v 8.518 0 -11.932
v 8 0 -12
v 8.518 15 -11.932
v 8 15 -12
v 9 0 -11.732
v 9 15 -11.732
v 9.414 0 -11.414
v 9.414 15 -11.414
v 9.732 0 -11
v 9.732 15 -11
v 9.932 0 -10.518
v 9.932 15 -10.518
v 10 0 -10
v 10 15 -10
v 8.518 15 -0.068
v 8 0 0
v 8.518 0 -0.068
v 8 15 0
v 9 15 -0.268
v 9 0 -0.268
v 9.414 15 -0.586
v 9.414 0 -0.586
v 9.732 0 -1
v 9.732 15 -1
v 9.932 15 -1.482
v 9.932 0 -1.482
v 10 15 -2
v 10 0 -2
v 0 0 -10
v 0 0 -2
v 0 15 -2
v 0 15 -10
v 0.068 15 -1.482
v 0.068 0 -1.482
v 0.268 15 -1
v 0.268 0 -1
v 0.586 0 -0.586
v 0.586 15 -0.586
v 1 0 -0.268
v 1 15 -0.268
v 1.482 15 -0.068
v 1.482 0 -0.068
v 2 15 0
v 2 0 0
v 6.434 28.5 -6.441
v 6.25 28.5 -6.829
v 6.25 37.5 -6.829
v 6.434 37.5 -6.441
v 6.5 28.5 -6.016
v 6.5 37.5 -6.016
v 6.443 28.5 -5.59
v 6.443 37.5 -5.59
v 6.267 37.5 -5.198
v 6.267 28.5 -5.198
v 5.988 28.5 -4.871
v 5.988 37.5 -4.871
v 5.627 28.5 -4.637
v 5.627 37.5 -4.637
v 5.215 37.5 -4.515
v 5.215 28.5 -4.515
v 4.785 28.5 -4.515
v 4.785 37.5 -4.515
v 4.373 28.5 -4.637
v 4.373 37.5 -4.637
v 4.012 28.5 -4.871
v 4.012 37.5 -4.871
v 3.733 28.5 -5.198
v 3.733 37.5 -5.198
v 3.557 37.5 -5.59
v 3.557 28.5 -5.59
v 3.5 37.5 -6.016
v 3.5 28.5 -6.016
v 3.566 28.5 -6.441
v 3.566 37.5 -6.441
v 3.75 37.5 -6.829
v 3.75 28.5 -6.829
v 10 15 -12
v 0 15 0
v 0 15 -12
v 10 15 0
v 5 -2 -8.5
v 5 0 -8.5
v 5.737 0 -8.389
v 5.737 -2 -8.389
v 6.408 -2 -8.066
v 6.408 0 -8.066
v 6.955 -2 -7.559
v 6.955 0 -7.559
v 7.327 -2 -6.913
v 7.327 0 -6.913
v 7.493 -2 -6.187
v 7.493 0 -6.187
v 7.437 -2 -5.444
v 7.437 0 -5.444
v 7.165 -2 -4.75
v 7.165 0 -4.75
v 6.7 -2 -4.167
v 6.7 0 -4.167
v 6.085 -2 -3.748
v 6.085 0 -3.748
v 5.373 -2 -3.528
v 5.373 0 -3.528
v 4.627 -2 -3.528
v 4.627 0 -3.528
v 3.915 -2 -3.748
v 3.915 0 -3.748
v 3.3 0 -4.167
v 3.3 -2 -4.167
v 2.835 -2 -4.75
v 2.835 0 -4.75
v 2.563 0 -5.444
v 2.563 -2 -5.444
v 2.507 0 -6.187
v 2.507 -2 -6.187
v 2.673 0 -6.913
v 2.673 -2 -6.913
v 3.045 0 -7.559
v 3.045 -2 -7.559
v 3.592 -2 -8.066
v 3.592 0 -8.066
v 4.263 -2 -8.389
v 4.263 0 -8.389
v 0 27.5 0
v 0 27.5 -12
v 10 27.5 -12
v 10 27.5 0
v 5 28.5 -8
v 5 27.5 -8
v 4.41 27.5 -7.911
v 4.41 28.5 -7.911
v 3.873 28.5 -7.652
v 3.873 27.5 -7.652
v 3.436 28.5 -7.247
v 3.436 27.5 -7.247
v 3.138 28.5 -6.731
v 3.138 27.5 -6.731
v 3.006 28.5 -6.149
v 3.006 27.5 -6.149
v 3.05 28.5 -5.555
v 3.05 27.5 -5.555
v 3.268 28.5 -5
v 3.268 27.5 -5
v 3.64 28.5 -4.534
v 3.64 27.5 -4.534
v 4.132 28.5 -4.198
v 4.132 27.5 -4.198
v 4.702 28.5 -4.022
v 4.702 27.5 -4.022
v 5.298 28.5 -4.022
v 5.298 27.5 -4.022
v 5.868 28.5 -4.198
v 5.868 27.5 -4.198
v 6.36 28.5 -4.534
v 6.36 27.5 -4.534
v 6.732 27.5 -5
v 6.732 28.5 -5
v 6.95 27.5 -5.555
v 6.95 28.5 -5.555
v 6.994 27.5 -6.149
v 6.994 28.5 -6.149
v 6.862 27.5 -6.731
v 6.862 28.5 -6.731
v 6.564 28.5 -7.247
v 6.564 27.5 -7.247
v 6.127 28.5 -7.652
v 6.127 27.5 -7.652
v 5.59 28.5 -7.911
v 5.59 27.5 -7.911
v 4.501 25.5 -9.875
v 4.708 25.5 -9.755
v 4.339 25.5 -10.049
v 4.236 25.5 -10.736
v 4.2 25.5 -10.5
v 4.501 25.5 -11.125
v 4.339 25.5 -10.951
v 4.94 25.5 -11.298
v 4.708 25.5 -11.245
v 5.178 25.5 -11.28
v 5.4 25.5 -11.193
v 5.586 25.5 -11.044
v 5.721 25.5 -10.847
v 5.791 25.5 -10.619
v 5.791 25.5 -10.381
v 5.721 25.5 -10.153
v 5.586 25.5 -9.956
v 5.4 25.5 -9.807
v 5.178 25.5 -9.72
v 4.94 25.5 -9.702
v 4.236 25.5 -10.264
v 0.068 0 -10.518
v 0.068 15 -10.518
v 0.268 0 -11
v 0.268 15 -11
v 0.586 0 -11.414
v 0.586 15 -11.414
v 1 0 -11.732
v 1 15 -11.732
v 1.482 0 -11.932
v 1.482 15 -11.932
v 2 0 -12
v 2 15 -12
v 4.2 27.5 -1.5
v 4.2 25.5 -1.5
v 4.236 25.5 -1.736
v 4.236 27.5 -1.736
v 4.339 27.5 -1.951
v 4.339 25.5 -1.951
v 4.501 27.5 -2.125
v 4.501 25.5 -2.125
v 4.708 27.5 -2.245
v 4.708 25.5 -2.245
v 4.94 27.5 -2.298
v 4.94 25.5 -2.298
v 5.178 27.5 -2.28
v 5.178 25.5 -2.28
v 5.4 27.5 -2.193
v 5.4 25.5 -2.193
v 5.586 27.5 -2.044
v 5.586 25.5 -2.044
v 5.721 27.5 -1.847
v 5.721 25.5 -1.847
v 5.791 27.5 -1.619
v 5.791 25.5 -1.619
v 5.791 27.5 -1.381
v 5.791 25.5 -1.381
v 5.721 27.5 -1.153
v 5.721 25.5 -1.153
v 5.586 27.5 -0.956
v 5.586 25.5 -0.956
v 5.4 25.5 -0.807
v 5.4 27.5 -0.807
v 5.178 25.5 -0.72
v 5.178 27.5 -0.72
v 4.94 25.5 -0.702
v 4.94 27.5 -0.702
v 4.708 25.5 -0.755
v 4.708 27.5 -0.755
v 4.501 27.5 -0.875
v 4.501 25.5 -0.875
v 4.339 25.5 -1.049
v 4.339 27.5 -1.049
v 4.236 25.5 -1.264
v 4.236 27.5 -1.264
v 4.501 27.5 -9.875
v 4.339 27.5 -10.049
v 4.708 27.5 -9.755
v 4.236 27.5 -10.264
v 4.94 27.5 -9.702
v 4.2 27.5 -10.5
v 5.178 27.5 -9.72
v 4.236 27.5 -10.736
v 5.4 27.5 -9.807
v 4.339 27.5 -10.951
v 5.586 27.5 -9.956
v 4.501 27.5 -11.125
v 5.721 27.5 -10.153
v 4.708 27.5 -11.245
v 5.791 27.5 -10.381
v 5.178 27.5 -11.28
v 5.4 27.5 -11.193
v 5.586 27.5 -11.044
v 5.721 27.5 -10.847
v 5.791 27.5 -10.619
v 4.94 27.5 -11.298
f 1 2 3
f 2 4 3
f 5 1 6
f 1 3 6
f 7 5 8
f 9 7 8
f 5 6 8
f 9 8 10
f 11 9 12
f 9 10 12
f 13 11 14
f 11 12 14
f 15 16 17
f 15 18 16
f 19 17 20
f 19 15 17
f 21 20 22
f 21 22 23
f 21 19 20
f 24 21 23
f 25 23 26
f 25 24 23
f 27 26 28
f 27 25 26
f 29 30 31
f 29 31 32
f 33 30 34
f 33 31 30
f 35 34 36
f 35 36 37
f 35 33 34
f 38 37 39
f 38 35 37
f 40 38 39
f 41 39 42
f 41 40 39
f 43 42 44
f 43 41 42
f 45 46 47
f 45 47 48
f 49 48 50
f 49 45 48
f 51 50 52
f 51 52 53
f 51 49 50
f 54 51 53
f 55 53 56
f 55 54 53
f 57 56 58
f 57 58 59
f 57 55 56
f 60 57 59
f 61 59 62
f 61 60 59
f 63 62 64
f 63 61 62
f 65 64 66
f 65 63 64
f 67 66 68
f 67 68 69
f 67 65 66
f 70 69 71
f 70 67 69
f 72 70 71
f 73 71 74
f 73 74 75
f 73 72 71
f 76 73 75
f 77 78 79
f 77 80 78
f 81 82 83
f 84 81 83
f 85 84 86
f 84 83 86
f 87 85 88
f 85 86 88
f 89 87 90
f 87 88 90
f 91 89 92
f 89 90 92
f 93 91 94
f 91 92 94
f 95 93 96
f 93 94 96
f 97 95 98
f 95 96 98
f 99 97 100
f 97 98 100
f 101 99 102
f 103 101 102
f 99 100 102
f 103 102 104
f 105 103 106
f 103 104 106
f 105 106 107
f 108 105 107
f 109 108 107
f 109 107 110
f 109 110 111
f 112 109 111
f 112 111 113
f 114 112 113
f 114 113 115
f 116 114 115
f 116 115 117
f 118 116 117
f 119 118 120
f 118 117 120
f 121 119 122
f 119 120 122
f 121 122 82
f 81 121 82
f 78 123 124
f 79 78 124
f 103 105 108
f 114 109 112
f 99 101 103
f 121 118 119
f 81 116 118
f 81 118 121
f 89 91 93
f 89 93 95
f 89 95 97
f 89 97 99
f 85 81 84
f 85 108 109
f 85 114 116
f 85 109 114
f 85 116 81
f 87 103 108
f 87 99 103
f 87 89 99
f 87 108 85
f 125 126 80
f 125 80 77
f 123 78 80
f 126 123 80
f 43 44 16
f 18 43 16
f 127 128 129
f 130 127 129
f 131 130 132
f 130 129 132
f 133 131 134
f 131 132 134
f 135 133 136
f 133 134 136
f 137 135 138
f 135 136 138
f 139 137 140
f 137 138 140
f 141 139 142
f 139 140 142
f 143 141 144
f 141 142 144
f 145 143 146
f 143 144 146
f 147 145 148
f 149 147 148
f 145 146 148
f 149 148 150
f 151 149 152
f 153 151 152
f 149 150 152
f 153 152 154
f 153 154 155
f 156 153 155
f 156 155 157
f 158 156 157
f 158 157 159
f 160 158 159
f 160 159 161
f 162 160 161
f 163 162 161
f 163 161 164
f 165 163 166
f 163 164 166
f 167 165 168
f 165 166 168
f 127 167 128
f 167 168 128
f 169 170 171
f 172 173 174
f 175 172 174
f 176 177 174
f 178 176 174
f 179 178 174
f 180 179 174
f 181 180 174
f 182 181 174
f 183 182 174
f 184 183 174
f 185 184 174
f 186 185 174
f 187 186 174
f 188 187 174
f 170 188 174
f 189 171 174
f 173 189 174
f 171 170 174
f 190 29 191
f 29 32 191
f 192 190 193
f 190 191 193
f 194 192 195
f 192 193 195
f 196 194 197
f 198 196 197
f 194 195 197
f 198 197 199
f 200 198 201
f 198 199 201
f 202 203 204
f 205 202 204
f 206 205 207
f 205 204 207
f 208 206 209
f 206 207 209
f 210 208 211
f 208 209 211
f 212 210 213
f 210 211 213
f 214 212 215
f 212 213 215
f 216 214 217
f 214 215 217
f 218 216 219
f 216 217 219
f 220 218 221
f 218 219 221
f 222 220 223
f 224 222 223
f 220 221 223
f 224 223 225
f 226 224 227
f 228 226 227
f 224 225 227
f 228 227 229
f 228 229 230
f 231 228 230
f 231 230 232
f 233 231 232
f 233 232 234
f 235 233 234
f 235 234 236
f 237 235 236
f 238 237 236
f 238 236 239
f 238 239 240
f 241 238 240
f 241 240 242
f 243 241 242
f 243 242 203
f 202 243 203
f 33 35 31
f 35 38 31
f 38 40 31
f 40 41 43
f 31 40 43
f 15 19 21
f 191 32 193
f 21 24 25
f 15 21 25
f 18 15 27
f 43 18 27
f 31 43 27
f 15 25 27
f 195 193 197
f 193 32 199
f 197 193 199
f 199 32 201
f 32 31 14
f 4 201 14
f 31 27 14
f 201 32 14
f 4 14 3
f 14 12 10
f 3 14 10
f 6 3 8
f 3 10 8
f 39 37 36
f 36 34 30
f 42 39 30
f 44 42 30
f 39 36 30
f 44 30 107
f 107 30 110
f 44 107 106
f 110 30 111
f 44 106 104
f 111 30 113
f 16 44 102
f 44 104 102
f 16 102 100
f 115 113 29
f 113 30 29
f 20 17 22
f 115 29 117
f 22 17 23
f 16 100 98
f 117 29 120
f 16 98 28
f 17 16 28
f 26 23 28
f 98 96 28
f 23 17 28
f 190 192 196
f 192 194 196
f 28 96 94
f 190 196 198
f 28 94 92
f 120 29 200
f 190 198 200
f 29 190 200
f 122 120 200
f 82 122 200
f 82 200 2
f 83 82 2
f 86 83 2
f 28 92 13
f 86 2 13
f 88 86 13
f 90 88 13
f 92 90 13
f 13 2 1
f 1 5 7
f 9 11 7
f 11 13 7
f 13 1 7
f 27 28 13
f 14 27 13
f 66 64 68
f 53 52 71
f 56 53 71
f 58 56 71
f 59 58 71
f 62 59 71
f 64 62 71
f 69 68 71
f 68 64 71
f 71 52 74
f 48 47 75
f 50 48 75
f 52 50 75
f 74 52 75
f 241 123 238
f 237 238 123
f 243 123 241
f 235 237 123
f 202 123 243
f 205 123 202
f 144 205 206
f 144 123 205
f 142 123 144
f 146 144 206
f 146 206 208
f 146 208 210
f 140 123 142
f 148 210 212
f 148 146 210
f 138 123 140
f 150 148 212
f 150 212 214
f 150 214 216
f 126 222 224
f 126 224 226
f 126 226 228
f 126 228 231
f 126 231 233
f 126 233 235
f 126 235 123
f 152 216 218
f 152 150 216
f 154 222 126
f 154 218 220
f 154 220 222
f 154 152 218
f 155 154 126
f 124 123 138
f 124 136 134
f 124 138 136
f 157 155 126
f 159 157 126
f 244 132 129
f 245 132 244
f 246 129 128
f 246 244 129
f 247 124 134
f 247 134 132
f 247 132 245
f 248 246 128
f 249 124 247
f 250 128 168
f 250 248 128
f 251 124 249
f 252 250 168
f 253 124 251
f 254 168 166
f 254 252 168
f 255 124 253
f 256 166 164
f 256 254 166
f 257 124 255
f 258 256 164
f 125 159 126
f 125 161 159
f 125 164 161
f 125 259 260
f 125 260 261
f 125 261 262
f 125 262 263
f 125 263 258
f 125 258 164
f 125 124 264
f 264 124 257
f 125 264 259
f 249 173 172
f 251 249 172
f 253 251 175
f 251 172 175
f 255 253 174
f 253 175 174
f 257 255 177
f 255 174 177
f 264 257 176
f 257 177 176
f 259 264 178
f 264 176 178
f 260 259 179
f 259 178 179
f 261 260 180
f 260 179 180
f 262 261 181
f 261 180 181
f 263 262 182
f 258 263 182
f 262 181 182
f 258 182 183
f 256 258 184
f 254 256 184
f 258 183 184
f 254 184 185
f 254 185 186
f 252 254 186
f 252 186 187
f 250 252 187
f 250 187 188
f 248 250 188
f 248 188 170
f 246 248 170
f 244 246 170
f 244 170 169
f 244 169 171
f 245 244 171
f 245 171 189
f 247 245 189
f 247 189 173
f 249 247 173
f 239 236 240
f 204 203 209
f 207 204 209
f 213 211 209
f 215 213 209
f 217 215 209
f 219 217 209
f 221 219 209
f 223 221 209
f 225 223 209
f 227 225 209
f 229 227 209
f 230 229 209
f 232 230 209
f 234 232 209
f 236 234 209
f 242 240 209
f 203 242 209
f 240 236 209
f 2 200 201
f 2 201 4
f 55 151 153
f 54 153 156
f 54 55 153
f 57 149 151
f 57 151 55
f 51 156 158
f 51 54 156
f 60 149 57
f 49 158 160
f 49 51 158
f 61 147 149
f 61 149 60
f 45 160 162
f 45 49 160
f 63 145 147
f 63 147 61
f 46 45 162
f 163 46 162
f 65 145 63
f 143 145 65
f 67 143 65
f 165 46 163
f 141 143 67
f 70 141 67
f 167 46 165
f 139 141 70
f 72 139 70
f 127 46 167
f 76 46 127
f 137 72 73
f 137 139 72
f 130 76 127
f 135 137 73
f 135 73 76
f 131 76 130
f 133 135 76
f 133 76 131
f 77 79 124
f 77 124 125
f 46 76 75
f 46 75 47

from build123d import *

# Parameters (mm, degrees)
SKETCH_1_W                  = 10
SKETCH_1_H                  = 12
EXTRUDE_1_DEPTH             = 27.5
EXTRUDE_2_DEPTH             = 10
SKETCH_3_R                  = 2
EXTRUDE_3_DEPTH             = 1
HOLE_WIZARD_1_6_1_6_1_D     = 1.6
HOLE_WIZARD_1_6_1_6_1_DEPTH = 2
SKETCH_7_R                  = 2.5
EXTRUDE_4_DEPTH             = 2
FILLET_1_R                  = 2


with BuildPart() as part:
    # 草图1 → 凸台-拉伸1 (new body)
    with BuildSketch(Plane(origin=(0, 0, 0), x_dir=(1, 0, 0), z_dir=(0, 1, 0))):
        with Locations((5, 6)):
            Rectangle(SKETCH_1_W, SKETCH_1_H)
    extrude(amount=EXTRUDE_1_DEPTH)

    # 草图2 → 凸台-拉伸2 (add)
    with BuildSketch(Plane(origin=(0, 27.5, 0), x_dir=(1, 0, 0), z_dir=(0, 1, 0))):
        with BuildLine():
            Line((3.75, 6.829156198), (6.25, 6.829156198))
            ThreePointArc((6.25, 6.829156198), (5, 4.5), (3.75, 6.829156198))
        make_face()
    extrude(amount=EXTRUDE_2_DEPTH)

    # 草图3 → 凸台-拉伸3 (add)
    with BuildSketch(Plane(origin=(0, 27.5, 0), x_dir=(1, 0, 0), z_dir=(0, 1, 0))):
        with Locations(Location((5, 6, 0), (0, 0, 90))):
            Circle(SKETCH_3_R)
    extrude(amount=EXTRUDE_3_DEPTH)

    # Ø1.6 (1.6) 直径孔1
    with Locations(Plane(origin=(0, 27.5, 0), x_dir=(1, 0, 0), z_dir=(0, 1, 0))):
        with Locations((5, 1.5), (5, 10.5)):
            Hole(HOLE_WIZARD_1_6_1_6_1_D / 2, depth=HOLE_WIZARD_1_6_1_6_1_DEPTH)

    # 草图7 → 凸台-拉伸4 (add)
    with BuildSketch(Plane.XZ):
        with Locations(Location((5, -6, 0), (0, 0, 270))):
            Circle(SKETCH_7_R)
    extrude(amount=EXTRUDE_4_DEPTH)


with BuildPart() as body_2:
    # Split Bodies 1: the piece on the far side of the plane
    add(part.part)
    split(bisect_by=Plane(origin=(0, 15, 0), x_dir=(0, 0, -1), z_dir=(0, -1, 0)), keep=Keep.BOTTOM)


with BuildPart() as part_1:
    add(part.part)

    # Split Bodies 1
    split(bisect_by=Plane(origin=(0, 15, 0), x_dir=(0, 0, -1), z_dir=(0, -1, 0)), keep=Keep.TOP)

    # 圆角1
    fillet_1_edges = [part_1.edges().sort_by_distance(p)[0] for p in [
        (0, 7.5, -12),
        (10, 7.5, -12),
        (10, 7.5, 0),
        (0, 7.5, 0),
    ]]
    fillet(fillet_1_edges, radius=FILLET_1_R)


solid = Compound([body_2.part, part_1.part])
